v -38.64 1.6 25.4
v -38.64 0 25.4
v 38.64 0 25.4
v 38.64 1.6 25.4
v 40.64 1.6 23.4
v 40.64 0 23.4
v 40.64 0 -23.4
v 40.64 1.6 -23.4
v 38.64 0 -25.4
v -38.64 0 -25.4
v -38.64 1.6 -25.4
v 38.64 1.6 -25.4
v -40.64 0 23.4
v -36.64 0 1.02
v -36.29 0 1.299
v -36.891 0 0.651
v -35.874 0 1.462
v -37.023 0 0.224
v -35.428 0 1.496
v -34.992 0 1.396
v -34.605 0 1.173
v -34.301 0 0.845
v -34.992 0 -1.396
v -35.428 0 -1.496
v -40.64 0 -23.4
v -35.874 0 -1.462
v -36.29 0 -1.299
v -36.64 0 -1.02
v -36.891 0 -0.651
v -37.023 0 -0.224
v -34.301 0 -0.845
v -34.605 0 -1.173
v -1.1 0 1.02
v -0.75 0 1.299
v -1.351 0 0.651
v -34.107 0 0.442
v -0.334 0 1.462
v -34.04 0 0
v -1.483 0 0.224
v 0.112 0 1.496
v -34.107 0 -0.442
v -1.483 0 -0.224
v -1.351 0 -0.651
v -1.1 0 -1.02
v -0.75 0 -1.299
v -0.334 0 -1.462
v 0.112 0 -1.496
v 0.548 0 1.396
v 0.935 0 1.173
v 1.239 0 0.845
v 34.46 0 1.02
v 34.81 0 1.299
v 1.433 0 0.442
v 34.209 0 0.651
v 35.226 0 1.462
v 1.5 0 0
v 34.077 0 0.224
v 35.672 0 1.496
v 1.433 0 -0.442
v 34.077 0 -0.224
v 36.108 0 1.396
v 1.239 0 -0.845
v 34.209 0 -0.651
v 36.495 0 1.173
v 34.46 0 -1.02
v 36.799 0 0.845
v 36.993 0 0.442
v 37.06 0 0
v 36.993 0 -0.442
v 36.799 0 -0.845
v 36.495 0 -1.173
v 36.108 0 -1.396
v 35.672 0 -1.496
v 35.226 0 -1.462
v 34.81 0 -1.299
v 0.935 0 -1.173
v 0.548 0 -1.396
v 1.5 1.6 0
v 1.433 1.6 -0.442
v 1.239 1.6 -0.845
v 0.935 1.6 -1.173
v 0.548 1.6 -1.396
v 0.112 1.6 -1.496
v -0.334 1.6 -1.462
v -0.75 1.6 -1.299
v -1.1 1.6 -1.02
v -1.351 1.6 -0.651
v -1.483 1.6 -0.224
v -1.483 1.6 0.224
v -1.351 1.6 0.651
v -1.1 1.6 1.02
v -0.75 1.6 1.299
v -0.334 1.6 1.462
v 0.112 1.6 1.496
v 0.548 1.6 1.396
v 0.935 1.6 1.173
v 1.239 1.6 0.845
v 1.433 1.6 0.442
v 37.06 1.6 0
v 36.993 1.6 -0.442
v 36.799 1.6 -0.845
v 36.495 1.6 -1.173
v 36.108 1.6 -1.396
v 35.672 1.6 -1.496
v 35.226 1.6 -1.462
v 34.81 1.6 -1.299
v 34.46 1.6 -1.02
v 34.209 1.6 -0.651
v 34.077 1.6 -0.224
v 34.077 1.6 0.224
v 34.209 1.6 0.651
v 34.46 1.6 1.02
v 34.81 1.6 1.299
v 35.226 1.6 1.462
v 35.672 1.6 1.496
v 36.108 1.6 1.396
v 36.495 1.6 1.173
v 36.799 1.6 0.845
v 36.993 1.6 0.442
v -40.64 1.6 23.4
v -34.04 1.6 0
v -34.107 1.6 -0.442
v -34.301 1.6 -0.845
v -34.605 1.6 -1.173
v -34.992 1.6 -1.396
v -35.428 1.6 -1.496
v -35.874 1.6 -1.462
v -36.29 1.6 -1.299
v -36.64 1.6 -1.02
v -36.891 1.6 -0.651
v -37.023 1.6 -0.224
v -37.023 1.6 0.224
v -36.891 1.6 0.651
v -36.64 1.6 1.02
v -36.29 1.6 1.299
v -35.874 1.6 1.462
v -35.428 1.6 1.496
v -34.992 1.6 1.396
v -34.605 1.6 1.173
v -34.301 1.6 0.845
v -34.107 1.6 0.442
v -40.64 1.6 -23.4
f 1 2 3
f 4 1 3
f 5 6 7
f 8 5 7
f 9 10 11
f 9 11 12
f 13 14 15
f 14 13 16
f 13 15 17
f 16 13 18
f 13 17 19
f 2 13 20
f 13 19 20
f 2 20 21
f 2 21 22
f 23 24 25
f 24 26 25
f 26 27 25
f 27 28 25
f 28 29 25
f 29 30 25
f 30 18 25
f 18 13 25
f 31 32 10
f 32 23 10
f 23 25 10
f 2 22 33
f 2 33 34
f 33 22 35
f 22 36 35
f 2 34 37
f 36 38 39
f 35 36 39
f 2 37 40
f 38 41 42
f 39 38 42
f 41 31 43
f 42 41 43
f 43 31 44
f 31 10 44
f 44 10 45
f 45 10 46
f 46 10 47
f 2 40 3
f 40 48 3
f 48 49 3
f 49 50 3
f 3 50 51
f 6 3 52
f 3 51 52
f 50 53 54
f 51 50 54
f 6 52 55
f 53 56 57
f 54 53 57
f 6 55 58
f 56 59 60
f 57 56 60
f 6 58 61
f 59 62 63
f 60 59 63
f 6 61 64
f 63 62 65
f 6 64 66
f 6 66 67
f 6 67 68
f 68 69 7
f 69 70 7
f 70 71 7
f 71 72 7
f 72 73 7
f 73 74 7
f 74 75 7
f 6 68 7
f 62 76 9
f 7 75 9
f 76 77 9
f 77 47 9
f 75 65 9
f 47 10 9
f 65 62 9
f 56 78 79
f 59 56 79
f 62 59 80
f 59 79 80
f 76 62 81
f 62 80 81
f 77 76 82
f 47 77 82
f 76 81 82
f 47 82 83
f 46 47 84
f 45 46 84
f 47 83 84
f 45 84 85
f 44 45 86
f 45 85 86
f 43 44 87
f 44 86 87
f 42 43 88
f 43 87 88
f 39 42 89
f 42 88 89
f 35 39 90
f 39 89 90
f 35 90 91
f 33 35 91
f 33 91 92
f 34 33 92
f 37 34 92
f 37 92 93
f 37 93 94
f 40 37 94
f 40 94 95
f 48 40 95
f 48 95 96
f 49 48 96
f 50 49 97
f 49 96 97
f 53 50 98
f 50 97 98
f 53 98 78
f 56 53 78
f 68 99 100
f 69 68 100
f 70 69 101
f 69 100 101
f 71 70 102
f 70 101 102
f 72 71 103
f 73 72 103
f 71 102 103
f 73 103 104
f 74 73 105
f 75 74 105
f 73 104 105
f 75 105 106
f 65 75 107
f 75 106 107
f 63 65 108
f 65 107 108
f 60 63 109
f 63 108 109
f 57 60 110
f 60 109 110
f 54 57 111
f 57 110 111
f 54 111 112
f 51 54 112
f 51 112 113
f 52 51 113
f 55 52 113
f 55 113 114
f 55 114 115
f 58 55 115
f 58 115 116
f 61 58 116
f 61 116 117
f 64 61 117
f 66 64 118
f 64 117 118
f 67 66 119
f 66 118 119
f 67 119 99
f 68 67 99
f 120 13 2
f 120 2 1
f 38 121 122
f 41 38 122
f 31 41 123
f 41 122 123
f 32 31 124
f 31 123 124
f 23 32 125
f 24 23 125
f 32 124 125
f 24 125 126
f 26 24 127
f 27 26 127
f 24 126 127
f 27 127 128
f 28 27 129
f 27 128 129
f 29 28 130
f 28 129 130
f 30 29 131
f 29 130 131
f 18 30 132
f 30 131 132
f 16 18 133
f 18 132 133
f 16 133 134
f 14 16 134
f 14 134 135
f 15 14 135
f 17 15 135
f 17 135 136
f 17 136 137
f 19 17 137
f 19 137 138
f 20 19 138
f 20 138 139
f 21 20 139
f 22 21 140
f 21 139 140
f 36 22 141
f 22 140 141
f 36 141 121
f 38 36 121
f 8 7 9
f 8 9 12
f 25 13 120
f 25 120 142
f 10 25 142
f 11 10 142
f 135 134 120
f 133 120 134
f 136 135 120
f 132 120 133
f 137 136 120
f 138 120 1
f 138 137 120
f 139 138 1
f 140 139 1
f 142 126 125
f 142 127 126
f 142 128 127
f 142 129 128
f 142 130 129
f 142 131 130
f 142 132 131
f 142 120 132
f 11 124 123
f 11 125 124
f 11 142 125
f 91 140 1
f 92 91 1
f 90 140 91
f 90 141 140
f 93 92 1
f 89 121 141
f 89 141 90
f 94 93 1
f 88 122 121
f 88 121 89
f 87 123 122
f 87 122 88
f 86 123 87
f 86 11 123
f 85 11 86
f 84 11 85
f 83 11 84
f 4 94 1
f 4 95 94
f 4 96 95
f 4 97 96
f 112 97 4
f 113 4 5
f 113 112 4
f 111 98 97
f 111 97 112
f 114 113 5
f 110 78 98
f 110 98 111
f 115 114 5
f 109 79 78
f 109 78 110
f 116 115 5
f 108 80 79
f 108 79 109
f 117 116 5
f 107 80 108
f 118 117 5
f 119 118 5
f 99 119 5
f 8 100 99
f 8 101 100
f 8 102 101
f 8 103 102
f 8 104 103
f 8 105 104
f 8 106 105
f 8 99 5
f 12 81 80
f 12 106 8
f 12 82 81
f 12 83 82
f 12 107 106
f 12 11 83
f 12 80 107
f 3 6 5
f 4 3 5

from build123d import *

# Parameters (mm, degrees)
SKETCH1_W           = 81.28
SKETCH1_H           = 50.8
BOSS_EXTRUDE1_DEPTH = 1.6002
SKETCH2_R           = 1.5
CUT_EXTRUDE1_DEPTH  = 1.6002
CHAMFER1_SIZE       = 2


with BuildPart() as part:
    # Sketch1 → Boss-Extrude1 (new body)
    with BuildSketch(Plane(origin=(0, 0, 0), x_dir=(1, 0, 0), z_dir=(0, 1, 0))):
        Rectangle(SKETCH1_W, SKETCH1_H)
    extrude(amount=BOSS_EXTRUDE1_DEPTH)

    # Sketch2 → Cut-Extrude1 (cut)
    with BuildSketch(Plane(origin=(0, 1.6002, 0), x_dir=(1, 0, 0), z_dir=(0, 1, 0))):
        with Locations((-35.54, 0)):
            Circle(SKETCH2_R)
        with Locations((35.56, 0)):
            Circle(SKETCH2_R)
        Circle(SKETCH2_R)
    extrude(amount=-CUT_EXTRUDE1_DEPTH, mode=Mode.SUBTRACT)

    # Chamfer1
    chamfer1_edges = [part.edges().sort_by_distance(p)[0] for p in [
        (40.64, 0.8001, 25.4),
        (-40.64, 0.8001, 25.4),
        (-40.64, 0.8001, -25.4),
        (40.64, 0.8001, -25.4),
    ]]
    chamfer(chamfer1_edges, length=CHAMFER1_SIZE)


solid = part.part
